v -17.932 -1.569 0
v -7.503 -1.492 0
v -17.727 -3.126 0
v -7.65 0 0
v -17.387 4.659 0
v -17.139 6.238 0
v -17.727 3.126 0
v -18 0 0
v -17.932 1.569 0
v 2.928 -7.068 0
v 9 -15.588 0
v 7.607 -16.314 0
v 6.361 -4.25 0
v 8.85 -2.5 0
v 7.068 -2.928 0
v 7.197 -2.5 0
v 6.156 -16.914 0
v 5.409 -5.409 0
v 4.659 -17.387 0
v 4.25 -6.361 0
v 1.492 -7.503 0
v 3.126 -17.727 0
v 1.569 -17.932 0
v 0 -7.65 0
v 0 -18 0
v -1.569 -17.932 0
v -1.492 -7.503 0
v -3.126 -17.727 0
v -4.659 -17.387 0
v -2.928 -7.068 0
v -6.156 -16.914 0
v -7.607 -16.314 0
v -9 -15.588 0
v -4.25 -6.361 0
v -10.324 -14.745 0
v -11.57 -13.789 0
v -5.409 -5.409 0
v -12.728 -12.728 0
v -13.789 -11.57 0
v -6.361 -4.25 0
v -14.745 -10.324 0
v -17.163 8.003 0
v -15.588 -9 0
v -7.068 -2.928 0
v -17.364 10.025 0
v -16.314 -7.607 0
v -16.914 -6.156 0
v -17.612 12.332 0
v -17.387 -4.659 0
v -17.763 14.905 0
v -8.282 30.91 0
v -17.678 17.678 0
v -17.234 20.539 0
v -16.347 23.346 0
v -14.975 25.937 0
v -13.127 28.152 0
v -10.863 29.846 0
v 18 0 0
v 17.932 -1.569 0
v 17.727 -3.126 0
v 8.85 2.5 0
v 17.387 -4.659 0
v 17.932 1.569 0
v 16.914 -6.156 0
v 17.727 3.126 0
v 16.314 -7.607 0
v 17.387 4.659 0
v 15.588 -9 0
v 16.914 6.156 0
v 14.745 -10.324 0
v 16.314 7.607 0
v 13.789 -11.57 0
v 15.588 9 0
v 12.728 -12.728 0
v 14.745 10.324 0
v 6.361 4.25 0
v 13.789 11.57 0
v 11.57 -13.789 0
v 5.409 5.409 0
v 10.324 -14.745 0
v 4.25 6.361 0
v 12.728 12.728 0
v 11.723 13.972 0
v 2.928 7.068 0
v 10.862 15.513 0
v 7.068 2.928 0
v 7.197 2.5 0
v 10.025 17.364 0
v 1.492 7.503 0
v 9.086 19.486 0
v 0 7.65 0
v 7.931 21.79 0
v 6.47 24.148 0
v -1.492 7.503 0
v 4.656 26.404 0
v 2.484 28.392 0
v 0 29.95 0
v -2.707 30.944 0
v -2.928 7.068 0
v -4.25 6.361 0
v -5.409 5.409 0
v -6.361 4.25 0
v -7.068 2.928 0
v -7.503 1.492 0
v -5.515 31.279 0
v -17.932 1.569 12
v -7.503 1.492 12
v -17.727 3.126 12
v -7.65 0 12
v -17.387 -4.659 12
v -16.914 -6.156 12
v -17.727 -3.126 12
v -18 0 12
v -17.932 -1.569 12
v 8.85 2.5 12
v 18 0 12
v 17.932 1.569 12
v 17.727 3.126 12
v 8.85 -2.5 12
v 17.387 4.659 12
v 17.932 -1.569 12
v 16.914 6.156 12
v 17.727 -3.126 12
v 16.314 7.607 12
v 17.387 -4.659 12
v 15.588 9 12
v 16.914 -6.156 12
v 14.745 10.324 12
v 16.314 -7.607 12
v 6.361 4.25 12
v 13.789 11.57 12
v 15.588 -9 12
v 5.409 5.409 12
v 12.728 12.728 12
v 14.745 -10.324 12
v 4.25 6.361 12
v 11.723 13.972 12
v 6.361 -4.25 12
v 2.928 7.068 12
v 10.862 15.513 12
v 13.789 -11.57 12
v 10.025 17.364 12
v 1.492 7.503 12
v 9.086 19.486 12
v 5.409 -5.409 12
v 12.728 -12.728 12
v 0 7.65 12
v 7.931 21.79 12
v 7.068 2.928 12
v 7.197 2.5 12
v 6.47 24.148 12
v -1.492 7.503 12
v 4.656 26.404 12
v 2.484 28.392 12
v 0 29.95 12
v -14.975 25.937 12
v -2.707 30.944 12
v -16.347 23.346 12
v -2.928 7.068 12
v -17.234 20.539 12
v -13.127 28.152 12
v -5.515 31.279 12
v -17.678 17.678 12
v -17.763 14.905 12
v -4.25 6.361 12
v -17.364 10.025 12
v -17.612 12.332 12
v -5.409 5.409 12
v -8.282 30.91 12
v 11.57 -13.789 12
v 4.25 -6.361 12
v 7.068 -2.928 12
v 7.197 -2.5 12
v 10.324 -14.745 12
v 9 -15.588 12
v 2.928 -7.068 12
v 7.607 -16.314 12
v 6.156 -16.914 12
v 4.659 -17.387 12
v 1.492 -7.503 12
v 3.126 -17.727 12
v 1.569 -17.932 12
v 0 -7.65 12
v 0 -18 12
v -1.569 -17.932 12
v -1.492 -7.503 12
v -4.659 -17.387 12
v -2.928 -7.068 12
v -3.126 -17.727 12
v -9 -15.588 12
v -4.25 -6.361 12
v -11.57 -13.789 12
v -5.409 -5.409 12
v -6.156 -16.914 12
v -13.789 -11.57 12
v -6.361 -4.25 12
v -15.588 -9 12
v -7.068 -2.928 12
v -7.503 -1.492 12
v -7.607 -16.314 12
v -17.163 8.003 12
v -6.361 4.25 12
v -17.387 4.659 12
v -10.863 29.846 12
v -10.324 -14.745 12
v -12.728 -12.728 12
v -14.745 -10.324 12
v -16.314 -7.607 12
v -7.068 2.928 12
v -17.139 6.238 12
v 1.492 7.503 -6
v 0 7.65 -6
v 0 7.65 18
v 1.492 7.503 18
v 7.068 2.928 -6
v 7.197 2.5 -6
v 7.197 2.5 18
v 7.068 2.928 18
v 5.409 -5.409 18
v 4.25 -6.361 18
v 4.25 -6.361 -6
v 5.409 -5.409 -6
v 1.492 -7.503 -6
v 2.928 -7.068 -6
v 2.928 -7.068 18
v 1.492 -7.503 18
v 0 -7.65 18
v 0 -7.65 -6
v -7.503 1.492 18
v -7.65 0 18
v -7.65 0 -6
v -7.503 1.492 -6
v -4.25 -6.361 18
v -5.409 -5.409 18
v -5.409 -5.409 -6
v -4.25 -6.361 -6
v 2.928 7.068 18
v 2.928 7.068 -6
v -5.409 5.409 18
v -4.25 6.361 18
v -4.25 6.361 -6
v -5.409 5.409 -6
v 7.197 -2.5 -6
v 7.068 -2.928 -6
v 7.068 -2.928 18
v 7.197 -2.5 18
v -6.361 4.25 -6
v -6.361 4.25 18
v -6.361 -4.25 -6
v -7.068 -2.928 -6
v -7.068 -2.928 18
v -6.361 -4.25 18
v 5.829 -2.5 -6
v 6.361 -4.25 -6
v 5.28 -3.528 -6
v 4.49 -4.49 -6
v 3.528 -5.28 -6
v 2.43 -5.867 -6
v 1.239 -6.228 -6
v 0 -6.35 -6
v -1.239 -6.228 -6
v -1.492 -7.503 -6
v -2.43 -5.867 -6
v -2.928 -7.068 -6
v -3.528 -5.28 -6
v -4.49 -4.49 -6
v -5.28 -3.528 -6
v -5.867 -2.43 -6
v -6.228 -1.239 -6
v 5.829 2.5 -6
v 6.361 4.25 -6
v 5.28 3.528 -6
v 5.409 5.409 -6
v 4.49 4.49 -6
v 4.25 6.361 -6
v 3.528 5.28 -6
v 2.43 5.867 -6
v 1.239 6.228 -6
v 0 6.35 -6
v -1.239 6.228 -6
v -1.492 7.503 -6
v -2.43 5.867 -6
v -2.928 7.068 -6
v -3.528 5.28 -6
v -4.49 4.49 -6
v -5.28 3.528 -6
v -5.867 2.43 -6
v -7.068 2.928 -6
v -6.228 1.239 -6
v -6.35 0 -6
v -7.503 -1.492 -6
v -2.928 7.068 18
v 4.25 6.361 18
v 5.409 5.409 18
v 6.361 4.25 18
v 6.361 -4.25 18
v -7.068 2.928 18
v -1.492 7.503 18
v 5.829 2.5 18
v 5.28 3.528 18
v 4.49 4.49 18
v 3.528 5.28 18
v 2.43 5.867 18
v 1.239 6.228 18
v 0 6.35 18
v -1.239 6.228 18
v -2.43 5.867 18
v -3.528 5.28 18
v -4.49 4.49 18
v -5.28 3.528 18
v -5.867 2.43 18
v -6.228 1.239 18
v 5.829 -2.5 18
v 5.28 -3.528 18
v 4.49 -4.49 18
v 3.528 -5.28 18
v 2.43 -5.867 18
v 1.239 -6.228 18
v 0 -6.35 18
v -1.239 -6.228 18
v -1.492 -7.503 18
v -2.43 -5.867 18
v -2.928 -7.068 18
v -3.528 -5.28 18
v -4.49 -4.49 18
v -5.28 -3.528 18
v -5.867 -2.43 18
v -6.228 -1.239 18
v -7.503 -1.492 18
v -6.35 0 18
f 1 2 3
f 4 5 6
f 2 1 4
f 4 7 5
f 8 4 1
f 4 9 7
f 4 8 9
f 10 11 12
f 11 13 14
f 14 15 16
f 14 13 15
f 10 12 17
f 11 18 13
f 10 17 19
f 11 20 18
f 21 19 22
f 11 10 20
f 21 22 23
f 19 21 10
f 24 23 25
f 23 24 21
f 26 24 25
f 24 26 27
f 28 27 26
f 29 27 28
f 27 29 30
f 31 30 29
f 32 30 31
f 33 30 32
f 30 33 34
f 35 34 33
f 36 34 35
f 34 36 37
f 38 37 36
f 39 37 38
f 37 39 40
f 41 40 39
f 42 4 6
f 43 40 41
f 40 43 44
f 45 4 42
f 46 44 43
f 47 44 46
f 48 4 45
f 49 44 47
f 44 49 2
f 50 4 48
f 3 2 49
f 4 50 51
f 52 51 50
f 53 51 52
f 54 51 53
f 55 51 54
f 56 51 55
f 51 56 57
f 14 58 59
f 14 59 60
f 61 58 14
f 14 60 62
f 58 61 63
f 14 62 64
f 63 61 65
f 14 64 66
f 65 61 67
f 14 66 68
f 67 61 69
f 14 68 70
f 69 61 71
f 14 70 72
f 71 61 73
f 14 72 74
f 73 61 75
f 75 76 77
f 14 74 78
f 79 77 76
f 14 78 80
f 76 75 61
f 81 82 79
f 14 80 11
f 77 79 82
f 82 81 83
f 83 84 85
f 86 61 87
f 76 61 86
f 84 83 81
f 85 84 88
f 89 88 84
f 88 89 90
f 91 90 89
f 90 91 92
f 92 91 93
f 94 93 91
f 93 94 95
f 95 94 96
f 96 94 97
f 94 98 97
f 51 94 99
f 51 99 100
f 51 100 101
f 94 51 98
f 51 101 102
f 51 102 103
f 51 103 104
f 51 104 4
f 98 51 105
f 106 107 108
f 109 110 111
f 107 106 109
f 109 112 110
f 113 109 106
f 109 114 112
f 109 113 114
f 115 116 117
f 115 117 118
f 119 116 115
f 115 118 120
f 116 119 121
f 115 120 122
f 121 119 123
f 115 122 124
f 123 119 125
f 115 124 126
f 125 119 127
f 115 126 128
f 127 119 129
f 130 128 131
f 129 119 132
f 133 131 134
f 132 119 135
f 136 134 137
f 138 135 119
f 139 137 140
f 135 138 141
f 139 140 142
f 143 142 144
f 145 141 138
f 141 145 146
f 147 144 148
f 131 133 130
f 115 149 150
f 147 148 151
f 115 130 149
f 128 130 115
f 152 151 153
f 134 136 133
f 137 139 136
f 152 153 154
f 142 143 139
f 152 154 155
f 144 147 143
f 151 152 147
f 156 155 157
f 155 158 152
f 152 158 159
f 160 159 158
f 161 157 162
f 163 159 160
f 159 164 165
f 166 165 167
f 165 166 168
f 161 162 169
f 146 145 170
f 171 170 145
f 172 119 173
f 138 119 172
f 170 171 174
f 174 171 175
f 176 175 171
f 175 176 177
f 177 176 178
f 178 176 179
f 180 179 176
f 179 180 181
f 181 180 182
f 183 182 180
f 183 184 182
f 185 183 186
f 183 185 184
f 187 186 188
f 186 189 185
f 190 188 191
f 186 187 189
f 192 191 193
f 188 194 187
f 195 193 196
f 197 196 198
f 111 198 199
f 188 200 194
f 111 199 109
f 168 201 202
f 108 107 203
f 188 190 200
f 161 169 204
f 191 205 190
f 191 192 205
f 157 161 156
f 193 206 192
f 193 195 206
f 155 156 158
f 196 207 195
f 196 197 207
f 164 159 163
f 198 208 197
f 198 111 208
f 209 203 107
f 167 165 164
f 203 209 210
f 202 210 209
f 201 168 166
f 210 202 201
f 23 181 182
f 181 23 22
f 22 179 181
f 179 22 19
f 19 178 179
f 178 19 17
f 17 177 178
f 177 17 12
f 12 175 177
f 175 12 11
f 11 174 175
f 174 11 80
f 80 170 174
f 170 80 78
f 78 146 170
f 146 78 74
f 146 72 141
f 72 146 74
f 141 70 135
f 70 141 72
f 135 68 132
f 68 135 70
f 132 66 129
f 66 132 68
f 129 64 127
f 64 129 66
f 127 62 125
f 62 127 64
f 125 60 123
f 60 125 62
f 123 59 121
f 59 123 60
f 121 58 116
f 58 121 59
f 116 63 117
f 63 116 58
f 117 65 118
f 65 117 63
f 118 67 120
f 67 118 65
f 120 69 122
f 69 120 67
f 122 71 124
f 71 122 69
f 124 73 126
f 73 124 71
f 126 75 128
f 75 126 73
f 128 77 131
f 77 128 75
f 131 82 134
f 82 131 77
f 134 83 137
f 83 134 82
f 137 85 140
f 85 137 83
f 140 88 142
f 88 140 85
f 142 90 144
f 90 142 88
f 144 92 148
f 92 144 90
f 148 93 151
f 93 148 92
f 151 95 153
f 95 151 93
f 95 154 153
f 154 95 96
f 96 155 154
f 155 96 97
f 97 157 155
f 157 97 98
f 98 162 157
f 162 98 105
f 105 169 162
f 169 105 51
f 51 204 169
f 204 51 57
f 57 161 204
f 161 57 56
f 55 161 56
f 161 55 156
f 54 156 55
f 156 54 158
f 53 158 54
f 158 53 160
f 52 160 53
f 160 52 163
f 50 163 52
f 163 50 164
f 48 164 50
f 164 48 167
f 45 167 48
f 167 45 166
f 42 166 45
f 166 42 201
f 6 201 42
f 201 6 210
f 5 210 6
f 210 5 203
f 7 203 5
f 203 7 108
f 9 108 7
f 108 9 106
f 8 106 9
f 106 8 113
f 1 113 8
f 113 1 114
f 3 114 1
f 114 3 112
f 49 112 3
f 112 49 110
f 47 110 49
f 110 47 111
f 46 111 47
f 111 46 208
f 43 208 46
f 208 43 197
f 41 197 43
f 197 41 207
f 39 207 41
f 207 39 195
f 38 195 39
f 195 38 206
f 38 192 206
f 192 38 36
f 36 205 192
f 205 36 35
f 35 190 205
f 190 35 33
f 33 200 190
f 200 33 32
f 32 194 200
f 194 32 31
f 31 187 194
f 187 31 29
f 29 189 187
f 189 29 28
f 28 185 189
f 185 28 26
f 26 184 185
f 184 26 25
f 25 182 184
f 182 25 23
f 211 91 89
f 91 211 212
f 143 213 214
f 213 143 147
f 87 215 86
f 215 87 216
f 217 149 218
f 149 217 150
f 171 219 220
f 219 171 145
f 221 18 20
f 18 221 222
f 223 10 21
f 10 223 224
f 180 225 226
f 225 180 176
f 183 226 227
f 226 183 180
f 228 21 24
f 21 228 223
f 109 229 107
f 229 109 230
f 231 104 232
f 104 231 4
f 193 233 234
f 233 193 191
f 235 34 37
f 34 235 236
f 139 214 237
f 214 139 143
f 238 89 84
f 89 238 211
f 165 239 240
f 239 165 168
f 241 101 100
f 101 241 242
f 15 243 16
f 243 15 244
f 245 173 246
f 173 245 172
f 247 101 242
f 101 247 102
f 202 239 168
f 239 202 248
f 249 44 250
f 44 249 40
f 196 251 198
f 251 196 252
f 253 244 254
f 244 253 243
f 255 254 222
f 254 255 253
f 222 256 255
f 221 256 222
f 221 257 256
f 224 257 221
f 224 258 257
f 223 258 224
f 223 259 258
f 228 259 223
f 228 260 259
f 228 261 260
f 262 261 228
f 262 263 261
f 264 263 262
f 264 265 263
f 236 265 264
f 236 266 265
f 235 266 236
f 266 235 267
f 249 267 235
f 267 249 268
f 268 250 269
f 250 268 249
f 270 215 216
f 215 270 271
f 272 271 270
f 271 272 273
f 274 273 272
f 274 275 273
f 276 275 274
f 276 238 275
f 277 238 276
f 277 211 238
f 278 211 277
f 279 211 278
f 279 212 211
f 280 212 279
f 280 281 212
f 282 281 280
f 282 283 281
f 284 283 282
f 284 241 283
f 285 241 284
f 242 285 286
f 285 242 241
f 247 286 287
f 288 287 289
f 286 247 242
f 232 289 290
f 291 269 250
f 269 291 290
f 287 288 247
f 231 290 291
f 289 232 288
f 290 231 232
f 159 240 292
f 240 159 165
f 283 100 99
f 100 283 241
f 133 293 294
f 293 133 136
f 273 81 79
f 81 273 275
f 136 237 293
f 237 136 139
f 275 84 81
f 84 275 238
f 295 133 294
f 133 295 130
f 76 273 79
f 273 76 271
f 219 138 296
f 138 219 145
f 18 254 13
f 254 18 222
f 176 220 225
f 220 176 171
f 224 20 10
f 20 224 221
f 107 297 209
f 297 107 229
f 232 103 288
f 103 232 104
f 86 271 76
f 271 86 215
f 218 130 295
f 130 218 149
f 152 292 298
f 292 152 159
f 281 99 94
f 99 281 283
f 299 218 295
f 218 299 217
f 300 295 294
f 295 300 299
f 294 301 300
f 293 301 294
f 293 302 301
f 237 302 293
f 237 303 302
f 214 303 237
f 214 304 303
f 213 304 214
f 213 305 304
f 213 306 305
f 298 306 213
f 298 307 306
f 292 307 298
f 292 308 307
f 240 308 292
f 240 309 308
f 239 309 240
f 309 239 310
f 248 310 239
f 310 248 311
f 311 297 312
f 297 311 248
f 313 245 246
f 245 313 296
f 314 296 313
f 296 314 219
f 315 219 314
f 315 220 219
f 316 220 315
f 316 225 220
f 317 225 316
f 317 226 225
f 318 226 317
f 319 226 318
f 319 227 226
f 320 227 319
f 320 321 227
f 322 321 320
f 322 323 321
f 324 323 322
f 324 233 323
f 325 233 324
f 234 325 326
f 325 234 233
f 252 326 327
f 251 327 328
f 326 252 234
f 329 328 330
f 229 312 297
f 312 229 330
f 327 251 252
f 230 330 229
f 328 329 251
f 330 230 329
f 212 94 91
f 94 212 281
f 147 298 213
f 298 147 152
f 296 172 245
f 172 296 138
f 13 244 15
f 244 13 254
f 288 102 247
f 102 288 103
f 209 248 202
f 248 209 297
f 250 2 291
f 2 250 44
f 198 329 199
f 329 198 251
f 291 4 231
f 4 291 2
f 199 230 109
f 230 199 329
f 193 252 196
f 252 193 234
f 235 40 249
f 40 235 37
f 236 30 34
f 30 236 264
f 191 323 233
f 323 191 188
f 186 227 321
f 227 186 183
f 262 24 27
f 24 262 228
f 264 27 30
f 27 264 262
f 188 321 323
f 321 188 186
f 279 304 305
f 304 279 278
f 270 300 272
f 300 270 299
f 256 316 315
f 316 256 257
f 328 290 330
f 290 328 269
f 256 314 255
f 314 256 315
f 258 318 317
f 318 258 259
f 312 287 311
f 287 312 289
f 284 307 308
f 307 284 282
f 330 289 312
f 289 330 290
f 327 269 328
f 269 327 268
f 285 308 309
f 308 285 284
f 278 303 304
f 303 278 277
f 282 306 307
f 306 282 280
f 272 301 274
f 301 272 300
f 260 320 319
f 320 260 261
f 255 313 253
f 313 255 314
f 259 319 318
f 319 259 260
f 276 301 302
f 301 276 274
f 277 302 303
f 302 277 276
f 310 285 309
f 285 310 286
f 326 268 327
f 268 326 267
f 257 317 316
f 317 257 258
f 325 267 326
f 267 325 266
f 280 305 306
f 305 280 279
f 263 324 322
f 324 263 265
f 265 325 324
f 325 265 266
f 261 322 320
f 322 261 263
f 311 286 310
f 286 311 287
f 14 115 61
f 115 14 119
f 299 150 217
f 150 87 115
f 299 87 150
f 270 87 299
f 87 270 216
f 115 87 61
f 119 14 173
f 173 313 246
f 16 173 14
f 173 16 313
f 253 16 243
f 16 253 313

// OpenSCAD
$fn = 32;

// ----------------------------------------------------------------------
// Cam: base radius 18 mm with a 14 mm lift over 120 degrees
// ----------------------------------------------------------------------

// --- parameters (mm) ---
base_r = 18;              // base radius
lift = 14;                // lift height above the base radius
lift_span = 120;          // angular width of the lift
lift_start = 45;          // angle where the lift starts
cam_t = 12;               // cam plate thickness
hub_d = 15.3;             // hub diameter
hub_h = 24;               // hub height
bore_d = 12.7;            // bore
key_w = 5;                // keyway width
key_depth = 1.6;          // keyway depth

cam_profile = [[18, 0], [17.932, 1.569], [17.727, 3.126], [17.387, 4.659], [16.914, 6.156], [16.314, 7.607], [15.588, 9], [14.745, 10.324], [13.789, 11.57], [12.728, 12.728], [11.723, 13.972], [10.862, 15.513], [10.025, 17.364], [9.086, 19.486], [7.931, 21.79], [6.47, 24.148], [4.656, 26.404], [2.484, 28.392], [0, 29.95], [-2.707, 30.944], [-5.515, 31.279], [-8.282, 30.91], [-10.863, 29.846], [-13.127, 28.152], [-14.975, 25.937], [-16.347, 23.346], [-17.234, 20.539], [-17.678, 17.678], [-17.763, 14.905], [-17.612, 12.332], [-17.364, 10.025], [-17.163, 8.003], [-17.139, 6.238], [-17.387, 4.659], [-17.727, 3.126], [-17.932, 1.569], [-18, 0], [-17.932, -1.569], [-17.727, -3.126], [-17.387, -4.659], [-16.914, -6.156], [-16.314, -7.607], [-15.588, -9], [-14.745, -10.324], [-13.789, -11.57], [-12.728, -12.728], [-11.57, -13.789], [-10.324, -14.745], [-9, -15.588], [-7.607, -16.314], [-6.156, -16.914], [-4.659, -17.387], [-3.126, -17.727], [-1.569, -17.932], [0, -18], [1.569, -17.932], [3.126, -17.727], [4.659, -17.387], [6.156, -16.914], [7.607, -16.314], [9, -15.588], [10.324, -14.745], [11.57, -13.789], [12.728, -12.728], [13.789, -11.57], [14.745, -10.324], [15.588, -9], [16.314, -7.607], [16.914, -6.156], [17.387, -4.659], [17.727, -3.126], [17.932, -1.569]];

difference() {
  union() {
    linear_extrude(height = cam_t) polygon(cam_profile);
    /* hub, proud of the cam plate on both sides */
    translate([0, 0, -6]) cylinder(h = hub_h, d = hub_d);
  }
  /* bore through the hub, 2.5 mm clear on both faces */
  translate([0, 0, -8.5]) cylinder(h = hub_h + 5, d = bore_d);
  /* keyway, milled through the whole hub */
  translate([4.75, -2.5, -8.5]) cube([4.1, 5, 29]);
}
